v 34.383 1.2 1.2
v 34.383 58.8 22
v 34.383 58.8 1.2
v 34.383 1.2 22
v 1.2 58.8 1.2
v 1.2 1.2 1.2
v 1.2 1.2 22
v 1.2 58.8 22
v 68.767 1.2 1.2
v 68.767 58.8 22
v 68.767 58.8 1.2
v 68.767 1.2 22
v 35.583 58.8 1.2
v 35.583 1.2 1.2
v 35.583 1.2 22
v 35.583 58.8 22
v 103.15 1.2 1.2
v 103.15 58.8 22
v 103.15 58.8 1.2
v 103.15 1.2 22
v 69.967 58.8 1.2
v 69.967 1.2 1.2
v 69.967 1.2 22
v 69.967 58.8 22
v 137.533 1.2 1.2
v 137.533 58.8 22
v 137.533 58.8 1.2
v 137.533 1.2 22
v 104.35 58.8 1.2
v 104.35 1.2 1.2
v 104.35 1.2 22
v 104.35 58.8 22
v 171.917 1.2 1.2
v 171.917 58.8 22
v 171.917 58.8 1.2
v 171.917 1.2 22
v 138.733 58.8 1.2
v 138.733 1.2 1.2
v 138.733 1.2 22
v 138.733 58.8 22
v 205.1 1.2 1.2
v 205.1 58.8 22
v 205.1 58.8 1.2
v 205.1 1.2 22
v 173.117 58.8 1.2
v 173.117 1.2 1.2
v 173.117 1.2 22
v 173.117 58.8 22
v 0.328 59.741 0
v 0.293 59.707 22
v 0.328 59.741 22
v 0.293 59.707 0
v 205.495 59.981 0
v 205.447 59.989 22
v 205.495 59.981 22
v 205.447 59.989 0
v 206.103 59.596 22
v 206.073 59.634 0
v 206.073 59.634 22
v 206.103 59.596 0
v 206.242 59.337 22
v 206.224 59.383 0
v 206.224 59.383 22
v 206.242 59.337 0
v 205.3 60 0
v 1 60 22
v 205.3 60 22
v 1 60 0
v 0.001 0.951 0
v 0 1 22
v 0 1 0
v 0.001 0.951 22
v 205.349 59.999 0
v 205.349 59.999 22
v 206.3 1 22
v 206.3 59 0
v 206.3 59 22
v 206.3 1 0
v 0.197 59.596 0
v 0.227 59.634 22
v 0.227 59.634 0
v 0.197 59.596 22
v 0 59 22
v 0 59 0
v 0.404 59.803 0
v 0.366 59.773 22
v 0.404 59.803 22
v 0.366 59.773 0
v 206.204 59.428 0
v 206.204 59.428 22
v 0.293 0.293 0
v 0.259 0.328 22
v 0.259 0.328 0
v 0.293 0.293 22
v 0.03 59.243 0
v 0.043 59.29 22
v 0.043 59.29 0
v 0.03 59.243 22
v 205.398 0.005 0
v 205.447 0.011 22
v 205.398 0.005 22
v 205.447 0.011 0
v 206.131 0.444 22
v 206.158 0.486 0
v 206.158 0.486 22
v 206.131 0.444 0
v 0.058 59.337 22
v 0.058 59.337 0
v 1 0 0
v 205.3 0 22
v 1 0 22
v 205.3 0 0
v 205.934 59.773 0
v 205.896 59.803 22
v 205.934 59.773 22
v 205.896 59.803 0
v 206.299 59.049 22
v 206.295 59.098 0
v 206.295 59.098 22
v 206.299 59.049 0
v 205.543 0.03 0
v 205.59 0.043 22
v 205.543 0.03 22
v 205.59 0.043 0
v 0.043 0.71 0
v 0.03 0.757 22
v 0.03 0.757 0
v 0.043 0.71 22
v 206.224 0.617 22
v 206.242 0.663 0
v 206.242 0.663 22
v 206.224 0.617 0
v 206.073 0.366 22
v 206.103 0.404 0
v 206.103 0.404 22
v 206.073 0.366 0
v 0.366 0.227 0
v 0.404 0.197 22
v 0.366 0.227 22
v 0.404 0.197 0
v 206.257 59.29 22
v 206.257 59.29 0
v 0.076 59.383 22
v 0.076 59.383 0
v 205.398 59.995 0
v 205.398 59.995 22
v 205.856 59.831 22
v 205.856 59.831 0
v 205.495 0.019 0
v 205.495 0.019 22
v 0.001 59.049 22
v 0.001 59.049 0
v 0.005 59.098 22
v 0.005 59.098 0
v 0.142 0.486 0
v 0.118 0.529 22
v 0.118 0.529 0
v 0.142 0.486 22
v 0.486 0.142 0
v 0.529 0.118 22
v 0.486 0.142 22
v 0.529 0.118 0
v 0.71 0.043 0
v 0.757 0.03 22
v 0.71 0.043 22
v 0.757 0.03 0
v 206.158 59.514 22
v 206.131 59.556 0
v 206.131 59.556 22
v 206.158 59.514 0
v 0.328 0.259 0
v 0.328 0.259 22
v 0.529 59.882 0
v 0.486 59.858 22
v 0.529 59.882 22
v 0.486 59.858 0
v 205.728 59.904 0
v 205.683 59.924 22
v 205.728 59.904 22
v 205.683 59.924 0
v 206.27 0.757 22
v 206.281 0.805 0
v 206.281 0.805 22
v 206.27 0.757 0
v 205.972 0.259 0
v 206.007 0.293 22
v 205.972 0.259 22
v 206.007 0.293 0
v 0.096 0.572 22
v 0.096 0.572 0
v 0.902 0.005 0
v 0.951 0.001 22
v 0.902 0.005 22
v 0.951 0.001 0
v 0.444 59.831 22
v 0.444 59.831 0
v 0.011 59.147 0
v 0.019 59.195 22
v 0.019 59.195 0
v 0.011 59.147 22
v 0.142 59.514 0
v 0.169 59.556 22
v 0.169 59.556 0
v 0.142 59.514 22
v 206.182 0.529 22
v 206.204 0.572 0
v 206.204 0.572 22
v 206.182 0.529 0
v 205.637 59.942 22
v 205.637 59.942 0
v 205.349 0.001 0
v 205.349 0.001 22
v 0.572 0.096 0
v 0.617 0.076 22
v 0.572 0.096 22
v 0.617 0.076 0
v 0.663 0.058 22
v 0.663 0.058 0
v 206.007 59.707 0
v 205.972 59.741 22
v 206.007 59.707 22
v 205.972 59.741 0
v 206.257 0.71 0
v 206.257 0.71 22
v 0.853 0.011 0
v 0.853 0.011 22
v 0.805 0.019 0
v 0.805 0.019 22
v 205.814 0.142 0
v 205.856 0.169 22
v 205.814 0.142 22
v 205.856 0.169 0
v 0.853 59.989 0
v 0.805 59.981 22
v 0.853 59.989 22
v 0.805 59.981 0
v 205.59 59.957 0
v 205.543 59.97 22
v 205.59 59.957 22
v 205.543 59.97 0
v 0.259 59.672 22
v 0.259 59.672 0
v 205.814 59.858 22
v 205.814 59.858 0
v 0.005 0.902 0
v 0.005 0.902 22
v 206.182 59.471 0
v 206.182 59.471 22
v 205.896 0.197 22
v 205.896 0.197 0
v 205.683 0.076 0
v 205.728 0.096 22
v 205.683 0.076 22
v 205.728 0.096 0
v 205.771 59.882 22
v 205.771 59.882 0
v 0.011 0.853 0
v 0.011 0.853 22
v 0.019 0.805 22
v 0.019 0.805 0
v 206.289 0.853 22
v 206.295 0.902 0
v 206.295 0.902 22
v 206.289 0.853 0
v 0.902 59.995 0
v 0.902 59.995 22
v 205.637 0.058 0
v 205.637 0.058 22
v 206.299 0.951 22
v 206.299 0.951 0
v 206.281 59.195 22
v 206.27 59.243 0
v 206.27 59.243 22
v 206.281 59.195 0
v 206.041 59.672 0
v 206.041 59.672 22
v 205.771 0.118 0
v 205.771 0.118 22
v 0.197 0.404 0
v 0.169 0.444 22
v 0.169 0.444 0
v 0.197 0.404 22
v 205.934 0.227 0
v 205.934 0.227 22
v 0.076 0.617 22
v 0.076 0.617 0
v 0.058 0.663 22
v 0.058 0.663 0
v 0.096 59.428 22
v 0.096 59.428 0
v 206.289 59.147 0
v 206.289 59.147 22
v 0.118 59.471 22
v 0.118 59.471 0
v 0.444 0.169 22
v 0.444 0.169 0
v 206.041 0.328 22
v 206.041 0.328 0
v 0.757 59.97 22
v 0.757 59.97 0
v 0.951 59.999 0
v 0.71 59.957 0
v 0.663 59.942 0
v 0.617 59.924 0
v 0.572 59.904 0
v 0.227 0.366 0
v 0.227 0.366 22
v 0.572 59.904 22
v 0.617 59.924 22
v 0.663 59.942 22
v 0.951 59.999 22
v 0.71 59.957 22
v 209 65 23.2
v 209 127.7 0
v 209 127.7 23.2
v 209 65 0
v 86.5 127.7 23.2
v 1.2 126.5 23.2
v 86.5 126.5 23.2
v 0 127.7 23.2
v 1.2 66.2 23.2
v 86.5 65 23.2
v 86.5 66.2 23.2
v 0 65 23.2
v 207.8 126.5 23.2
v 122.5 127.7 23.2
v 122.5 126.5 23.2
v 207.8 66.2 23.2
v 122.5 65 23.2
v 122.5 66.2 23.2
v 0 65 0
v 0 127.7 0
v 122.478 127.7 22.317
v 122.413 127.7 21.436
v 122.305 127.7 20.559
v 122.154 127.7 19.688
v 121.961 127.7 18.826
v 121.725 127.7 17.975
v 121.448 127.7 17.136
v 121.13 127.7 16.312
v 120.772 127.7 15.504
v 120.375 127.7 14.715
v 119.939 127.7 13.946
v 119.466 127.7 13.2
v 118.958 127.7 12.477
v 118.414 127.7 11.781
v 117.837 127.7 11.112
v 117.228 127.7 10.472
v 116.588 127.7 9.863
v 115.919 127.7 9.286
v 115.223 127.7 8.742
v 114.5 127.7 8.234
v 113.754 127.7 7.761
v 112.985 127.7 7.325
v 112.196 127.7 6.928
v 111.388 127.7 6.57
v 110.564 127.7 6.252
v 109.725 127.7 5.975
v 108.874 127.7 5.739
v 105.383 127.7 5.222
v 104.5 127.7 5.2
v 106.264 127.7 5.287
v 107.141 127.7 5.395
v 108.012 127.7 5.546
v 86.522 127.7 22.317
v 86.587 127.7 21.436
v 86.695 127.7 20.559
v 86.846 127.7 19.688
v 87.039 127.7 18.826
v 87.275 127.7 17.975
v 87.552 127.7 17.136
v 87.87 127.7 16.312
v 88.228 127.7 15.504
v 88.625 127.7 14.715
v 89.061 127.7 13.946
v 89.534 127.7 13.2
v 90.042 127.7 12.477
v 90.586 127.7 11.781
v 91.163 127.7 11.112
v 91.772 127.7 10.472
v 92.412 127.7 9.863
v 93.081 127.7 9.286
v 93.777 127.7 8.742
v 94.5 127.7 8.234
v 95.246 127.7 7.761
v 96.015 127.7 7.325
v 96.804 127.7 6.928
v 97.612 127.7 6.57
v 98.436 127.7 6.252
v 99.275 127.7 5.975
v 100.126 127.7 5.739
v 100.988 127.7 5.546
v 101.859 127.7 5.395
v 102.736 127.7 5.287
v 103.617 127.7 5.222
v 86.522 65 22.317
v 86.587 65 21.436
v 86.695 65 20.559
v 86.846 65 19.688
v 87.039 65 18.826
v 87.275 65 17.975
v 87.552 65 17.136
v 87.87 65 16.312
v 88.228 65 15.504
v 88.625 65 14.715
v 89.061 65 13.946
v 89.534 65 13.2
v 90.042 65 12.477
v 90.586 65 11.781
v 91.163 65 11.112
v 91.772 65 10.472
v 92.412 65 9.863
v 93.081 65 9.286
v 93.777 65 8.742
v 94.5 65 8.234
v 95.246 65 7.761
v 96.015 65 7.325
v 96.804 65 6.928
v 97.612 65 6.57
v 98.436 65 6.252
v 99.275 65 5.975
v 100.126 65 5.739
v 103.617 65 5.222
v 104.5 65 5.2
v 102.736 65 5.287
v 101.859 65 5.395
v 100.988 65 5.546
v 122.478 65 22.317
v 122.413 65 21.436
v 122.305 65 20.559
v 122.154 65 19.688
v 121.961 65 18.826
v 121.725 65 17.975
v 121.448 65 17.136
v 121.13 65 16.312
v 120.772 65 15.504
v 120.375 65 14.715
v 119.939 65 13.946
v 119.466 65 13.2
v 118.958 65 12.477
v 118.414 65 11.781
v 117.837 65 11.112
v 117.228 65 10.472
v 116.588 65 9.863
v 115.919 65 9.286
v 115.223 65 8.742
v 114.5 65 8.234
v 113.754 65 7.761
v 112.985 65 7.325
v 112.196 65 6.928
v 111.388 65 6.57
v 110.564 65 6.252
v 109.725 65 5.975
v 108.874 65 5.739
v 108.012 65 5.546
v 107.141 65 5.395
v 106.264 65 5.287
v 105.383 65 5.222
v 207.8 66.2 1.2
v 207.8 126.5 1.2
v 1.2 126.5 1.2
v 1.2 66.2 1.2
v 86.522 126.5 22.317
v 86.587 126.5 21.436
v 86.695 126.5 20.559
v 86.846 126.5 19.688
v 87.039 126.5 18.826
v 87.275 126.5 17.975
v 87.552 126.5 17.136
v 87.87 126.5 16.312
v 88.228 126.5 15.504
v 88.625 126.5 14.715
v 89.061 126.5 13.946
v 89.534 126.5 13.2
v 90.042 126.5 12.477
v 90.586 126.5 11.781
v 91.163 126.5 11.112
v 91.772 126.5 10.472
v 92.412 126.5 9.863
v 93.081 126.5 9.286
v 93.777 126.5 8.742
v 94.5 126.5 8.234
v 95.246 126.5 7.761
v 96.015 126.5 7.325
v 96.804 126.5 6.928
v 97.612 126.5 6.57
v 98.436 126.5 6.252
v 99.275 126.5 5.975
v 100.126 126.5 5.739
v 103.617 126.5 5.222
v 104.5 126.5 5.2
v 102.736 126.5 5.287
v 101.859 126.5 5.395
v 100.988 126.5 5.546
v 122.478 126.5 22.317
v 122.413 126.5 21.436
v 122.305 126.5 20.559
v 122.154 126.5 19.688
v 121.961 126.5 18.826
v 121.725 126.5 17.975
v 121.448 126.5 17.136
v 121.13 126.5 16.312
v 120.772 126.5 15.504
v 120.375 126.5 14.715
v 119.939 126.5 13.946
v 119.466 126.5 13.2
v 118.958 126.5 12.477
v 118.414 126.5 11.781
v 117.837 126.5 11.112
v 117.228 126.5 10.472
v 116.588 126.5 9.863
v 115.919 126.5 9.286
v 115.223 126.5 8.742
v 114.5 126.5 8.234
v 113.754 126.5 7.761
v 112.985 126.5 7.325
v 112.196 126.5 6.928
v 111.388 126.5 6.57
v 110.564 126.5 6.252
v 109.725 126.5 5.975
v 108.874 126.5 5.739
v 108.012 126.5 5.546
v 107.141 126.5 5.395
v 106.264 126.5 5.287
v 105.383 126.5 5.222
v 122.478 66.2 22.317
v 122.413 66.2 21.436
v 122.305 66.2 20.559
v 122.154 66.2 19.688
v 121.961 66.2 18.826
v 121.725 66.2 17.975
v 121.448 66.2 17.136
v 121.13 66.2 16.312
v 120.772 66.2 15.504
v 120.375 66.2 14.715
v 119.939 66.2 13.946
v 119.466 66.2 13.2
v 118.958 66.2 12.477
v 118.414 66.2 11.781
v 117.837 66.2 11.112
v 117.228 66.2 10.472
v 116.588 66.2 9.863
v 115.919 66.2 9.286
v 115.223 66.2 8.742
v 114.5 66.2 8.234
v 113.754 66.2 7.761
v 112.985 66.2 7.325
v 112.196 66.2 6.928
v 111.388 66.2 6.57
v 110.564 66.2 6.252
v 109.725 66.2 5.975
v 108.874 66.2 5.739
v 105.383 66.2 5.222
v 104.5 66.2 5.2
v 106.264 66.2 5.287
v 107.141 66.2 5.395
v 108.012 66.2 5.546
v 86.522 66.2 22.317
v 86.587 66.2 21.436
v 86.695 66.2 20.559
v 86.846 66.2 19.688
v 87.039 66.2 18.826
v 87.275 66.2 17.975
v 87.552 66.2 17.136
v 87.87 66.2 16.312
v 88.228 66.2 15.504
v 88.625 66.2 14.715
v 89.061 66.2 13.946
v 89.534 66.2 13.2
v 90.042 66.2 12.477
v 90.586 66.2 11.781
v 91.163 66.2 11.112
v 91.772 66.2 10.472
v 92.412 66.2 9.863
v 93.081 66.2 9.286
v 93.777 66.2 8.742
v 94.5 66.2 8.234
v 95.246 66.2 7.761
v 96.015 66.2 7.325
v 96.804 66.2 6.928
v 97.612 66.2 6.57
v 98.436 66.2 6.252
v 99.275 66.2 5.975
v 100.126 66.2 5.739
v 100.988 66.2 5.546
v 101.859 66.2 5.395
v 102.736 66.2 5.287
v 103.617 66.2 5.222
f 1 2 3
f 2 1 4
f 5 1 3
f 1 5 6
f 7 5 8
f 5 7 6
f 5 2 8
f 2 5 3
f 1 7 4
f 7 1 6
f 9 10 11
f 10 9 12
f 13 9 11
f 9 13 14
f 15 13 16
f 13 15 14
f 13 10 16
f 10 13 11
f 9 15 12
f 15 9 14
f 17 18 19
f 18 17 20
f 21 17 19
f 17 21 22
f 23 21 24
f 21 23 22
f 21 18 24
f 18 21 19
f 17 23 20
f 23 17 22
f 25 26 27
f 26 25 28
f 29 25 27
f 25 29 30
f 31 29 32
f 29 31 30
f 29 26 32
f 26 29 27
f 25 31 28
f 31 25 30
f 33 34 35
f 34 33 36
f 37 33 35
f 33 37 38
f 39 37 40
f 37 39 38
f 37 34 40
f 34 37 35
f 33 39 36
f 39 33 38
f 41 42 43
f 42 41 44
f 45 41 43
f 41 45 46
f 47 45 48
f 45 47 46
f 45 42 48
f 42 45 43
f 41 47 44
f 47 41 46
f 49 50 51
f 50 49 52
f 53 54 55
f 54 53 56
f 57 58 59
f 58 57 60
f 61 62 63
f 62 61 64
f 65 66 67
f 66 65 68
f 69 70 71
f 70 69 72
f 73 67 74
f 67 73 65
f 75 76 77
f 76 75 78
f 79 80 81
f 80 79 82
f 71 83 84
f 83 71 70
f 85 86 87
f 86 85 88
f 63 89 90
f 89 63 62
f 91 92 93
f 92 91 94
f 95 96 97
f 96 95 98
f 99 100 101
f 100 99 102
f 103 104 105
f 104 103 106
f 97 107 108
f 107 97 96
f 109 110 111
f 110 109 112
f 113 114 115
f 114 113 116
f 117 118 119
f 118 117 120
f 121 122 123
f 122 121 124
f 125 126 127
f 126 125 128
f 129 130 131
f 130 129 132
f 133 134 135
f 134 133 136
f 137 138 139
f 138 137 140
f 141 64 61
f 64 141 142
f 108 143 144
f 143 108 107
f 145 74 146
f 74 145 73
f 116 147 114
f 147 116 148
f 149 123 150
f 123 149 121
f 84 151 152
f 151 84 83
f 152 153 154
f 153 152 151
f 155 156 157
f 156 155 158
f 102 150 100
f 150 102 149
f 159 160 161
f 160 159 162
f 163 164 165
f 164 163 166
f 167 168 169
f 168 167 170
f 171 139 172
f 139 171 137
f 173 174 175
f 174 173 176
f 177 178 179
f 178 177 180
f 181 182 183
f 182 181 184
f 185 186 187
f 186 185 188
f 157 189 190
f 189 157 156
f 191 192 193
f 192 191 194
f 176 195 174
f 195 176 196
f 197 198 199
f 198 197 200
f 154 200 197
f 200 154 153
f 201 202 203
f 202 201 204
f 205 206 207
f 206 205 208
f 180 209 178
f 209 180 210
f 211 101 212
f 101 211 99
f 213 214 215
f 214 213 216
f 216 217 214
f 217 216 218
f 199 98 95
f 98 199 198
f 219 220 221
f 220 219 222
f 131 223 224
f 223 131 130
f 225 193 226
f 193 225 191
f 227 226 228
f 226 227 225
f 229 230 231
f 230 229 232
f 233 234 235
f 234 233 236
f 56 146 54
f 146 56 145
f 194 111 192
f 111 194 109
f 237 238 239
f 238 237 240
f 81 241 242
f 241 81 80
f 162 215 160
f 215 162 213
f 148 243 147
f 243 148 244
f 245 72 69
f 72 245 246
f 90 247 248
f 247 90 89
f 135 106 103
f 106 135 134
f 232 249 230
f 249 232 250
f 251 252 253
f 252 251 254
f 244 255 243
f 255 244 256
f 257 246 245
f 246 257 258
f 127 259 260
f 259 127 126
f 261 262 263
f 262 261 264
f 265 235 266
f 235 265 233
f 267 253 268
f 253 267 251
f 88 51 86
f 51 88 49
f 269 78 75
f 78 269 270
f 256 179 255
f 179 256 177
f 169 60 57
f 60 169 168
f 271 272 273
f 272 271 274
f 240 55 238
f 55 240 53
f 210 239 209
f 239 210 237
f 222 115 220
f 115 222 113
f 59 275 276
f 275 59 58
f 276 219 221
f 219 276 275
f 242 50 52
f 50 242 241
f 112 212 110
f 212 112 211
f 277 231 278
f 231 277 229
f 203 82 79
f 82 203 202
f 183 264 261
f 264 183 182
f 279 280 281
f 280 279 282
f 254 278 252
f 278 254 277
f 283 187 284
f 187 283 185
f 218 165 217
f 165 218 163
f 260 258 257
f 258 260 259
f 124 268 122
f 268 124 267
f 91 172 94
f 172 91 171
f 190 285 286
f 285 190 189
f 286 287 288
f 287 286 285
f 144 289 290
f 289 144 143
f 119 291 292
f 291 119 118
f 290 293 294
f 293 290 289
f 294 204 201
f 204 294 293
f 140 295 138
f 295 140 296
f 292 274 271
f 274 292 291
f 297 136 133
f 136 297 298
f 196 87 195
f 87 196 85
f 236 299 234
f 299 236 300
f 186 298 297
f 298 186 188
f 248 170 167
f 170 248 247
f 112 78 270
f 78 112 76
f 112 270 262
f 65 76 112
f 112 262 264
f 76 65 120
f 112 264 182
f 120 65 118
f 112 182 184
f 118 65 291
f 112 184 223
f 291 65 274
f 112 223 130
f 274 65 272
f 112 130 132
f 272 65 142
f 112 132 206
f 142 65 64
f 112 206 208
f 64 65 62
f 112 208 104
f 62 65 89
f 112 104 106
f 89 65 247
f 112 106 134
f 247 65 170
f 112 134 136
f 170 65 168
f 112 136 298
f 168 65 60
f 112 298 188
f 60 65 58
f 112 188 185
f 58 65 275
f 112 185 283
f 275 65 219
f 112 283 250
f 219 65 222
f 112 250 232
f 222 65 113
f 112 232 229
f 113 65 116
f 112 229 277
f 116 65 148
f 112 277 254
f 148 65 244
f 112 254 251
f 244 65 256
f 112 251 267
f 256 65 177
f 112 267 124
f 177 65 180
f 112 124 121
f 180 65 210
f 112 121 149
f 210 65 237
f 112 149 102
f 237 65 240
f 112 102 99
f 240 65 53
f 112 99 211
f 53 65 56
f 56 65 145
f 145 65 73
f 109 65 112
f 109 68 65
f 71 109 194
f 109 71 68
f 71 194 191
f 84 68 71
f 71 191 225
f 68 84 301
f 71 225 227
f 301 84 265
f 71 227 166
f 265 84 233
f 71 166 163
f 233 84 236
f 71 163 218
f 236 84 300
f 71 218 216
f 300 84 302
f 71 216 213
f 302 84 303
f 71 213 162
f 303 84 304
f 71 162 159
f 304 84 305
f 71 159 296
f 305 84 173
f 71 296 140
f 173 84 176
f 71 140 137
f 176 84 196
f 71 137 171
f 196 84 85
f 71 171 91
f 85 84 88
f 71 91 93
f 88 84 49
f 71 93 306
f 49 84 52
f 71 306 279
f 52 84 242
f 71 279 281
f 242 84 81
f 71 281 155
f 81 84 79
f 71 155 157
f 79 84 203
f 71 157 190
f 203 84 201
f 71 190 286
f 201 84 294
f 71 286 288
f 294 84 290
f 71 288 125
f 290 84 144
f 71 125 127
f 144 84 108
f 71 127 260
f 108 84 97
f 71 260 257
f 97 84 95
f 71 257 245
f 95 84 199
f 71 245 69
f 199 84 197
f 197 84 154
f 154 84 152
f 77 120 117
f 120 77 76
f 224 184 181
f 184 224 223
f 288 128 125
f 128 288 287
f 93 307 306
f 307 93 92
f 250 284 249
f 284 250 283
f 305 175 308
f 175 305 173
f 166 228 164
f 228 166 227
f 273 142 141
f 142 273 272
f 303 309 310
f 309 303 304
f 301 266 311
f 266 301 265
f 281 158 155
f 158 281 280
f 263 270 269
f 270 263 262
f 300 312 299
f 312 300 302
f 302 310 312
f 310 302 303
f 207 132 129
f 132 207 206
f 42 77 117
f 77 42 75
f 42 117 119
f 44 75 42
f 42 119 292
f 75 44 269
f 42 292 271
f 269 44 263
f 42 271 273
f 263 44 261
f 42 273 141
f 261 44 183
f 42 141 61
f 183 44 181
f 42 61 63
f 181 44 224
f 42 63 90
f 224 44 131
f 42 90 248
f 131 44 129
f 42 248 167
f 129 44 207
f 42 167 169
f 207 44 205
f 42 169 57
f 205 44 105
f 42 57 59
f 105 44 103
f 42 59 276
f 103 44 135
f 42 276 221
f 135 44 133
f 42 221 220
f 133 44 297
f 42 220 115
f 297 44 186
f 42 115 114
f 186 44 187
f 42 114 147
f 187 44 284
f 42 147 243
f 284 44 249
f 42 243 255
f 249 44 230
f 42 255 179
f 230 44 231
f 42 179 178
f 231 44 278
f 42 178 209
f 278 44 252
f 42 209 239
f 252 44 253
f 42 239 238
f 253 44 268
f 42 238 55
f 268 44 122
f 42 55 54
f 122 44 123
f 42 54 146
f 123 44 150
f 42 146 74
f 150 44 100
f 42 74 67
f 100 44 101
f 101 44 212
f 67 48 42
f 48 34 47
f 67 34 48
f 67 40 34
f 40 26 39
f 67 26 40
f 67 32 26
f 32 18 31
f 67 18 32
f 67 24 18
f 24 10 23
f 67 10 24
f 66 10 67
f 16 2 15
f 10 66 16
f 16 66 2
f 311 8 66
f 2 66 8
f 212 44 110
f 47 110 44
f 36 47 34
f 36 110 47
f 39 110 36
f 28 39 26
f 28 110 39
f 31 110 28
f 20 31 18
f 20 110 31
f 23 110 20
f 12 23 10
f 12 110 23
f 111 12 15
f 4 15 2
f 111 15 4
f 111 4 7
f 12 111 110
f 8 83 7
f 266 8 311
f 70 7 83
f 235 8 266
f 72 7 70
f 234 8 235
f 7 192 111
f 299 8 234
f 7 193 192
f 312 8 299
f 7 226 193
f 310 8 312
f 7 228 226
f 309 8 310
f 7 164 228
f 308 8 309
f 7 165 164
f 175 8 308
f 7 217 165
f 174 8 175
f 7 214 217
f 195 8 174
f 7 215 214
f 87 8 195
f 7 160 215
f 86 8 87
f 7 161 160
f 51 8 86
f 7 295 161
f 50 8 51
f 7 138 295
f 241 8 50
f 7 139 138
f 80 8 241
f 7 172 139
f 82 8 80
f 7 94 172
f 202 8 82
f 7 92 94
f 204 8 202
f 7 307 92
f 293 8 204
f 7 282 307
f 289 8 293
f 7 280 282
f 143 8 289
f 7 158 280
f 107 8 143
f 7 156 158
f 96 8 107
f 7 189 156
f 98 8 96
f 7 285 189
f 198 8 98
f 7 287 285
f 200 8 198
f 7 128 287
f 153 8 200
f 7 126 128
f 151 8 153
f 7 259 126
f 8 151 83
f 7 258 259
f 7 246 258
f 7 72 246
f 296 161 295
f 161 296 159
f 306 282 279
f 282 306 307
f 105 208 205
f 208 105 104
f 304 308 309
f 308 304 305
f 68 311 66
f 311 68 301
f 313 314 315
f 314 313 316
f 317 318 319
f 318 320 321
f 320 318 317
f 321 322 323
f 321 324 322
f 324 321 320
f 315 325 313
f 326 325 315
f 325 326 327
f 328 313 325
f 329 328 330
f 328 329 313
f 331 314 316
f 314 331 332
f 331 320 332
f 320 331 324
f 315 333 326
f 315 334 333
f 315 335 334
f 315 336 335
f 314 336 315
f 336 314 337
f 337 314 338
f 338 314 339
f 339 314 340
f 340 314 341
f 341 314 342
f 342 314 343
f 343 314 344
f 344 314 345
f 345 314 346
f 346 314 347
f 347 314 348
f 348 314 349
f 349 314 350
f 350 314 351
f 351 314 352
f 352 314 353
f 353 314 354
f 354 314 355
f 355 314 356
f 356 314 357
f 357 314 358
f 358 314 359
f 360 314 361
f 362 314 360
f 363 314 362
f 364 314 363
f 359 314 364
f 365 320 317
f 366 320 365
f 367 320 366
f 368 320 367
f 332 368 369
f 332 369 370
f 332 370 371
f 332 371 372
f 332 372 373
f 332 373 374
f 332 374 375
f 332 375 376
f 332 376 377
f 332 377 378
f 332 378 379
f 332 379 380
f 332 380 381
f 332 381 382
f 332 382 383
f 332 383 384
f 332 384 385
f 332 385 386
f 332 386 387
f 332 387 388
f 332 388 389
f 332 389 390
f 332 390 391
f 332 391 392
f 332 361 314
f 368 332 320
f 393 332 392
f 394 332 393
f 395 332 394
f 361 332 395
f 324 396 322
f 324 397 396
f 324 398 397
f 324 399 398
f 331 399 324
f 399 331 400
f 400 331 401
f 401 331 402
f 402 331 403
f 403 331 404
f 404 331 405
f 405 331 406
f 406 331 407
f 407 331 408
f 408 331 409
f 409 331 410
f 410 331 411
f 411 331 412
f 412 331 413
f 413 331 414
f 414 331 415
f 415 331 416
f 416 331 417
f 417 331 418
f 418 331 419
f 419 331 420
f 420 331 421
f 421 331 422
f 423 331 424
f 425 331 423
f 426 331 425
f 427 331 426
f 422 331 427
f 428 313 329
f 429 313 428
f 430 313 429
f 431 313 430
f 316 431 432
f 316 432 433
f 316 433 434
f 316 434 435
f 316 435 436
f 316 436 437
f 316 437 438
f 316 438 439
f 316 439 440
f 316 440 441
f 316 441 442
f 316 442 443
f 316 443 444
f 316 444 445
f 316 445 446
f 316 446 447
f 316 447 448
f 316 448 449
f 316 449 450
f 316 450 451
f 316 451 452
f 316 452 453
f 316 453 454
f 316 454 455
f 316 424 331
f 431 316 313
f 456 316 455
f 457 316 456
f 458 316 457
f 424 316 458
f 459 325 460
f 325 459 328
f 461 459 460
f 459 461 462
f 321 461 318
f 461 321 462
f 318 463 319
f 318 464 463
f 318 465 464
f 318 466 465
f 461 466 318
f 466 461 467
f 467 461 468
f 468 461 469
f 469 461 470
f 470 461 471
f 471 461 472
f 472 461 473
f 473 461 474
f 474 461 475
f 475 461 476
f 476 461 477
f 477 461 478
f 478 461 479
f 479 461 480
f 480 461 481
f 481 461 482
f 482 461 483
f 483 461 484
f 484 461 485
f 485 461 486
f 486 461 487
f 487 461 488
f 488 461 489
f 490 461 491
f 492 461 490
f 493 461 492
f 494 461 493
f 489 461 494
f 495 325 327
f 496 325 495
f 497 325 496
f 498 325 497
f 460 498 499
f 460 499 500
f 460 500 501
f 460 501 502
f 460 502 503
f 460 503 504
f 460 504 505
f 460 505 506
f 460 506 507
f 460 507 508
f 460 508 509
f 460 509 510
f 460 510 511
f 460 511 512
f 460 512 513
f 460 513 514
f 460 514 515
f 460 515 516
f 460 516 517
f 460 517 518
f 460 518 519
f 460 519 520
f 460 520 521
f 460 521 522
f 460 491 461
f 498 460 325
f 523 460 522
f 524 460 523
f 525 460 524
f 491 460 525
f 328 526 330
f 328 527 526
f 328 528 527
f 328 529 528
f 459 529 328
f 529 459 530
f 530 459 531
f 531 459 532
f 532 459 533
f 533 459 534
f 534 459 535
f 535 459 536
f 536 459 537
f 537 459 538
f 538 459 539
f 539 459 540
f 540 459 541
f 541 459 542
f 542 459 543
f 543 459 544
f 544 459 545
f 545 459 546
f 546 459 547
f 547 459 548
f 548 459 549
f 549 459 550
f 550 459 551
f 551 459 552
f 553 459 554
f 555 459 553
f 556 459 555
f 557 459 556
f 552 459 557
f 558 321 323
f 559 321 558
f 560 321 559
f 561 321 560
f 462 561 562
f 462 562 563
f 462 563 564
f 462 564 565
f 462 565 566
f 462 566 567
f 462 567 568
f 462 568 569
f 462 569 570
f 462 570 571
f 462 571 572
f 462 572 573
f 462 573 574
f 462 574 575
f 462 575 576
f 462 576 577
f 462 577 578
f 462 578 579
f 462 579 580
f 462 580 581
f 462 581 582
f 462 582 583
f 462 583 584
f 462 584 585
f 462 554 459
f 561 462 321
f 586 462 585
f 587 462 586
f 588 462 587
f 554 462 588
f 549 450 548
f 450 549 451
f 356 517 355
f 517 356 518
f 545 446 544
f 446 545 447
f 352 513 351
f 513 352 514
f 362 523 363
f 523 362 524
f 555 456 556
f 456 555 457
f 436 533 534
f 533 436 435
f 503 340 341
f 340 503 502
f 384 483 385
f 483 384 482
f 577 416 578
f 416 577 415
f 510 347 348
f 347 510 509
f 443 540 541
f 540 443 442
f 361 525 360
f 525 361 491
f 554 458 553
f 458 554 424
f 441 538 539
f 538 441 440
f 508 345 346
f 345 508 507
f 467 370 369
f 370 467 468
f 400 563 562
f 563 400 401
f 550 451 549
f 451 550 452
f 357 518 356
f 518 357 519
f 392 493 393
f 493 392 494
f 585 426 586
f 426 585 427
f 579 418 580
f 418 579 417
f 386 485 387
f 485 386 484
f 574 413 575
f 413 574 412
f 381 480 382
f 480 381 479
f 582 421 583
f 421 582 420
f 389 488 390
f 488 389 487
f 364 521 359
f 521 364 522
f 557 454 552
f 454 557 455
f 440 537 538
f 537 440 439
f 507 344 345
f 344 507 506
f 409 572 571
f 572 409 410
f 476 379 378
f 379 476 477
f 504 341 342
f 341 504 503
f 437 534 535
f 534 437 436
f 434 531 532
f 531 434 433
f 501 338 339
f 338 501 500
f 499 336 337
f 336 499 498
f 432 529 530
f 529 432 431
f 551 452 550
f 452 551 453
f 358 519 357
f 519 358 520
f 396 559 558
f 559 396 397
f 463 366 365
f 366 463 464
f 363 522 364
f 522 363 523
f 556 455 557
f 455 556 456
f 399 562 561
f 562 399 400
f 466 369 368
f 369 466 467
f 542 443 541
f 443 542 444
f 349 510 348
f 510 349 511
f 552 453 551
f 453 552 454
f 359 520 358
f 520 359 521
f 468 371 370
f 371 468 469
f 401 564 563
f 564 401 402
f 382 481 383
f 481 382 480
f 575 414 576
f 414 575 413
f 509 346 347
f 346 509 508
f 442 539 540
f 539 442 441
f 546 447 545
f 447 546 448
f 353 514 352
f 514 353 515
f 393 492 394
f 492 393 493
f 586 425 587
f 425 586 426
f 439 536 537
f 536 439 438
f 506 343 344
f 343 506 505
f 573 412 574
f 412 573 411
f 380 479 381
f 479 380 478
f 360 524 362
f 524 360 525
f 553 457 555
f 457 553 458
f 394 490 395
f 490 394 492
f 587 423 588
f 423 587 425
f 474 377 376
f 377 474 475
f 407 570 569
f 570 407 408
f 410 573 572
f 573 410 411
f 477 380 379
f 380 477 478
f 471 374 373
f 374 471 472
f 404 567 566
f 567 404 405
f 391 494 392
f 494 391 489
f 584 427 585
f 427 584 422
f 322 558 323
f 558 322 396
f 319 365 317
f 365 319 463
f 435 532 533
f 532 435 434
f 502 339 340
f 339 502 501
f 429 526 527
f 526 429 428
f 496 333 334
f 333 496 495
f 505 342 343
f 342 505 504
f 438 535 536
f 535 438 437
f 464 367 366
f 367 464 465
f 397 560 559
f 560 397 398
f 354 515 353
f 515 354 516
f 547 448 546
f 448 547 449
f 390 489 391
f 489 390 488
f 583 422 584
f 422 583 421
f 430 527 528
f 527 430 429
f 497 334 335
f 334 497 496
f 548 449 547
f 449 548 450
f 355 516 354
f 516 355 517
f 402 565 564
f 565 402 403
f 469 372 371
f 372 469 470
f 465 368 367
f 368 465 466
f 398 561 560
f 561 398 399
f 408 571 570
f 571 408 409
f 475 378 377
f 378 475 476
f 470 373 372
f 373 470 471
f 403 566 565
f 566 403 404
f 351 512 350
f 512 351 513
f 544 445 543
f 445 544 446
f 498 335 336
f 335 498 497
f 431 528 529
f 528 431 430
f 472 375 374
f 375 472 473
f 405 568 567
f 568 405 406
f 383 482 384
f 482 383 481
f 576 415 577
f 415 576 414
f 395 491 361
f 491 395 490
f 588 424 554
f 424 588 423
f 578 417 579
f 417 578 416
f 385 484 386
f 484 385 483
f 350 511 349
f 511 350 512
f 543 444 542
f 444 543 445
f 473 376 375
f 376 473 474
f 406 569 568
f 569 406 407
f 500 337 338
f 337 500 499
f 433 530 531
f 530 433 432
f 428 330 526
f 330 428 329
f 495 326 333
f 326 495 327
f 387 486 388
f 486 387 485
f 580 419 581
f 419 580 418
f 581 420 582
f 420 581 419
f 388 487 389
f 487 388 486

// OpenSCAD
// file: main.scad
// Ra
include <../lib/BoardGameSystem.scad>;

main_box_width = 209; // X
main_box_height = 65; // Y
hex_bottom = 6;
no_hex = 0;
wallThickness = 1.2;
$fn = $preview ? 32 : 128;
lid_tolerance = 0.3;

// Scoring tokens. 6 lanes 
module ScoringTokenBox() {
    length = main_box_width - (wallThickness * 2) - lid_tolerance;
    tokenBox(size=[length, 60, 22], hexBottom=no_hex, corner=1, containersX=6);
}

module ScoringTokenLid() {
    width = 60 + (wallThickness * 2) + lid_tolerance;
    height = 22 + wallThickness;
    radius = 18;
    difference() {
    tokenBox(size=[209, width, height], hexBottom=no_hex, corner=0, wallThickness=wallThickness);
        translate([(209)/2,width/2,height])
        rotate([90, 90, 0])
        cylinder(width, radius, radius, center = true);
    }
}
// main file
include<main.scad>;

ScoringTokenBox();

translate([0,65,0])
ScoringTokenLid();
